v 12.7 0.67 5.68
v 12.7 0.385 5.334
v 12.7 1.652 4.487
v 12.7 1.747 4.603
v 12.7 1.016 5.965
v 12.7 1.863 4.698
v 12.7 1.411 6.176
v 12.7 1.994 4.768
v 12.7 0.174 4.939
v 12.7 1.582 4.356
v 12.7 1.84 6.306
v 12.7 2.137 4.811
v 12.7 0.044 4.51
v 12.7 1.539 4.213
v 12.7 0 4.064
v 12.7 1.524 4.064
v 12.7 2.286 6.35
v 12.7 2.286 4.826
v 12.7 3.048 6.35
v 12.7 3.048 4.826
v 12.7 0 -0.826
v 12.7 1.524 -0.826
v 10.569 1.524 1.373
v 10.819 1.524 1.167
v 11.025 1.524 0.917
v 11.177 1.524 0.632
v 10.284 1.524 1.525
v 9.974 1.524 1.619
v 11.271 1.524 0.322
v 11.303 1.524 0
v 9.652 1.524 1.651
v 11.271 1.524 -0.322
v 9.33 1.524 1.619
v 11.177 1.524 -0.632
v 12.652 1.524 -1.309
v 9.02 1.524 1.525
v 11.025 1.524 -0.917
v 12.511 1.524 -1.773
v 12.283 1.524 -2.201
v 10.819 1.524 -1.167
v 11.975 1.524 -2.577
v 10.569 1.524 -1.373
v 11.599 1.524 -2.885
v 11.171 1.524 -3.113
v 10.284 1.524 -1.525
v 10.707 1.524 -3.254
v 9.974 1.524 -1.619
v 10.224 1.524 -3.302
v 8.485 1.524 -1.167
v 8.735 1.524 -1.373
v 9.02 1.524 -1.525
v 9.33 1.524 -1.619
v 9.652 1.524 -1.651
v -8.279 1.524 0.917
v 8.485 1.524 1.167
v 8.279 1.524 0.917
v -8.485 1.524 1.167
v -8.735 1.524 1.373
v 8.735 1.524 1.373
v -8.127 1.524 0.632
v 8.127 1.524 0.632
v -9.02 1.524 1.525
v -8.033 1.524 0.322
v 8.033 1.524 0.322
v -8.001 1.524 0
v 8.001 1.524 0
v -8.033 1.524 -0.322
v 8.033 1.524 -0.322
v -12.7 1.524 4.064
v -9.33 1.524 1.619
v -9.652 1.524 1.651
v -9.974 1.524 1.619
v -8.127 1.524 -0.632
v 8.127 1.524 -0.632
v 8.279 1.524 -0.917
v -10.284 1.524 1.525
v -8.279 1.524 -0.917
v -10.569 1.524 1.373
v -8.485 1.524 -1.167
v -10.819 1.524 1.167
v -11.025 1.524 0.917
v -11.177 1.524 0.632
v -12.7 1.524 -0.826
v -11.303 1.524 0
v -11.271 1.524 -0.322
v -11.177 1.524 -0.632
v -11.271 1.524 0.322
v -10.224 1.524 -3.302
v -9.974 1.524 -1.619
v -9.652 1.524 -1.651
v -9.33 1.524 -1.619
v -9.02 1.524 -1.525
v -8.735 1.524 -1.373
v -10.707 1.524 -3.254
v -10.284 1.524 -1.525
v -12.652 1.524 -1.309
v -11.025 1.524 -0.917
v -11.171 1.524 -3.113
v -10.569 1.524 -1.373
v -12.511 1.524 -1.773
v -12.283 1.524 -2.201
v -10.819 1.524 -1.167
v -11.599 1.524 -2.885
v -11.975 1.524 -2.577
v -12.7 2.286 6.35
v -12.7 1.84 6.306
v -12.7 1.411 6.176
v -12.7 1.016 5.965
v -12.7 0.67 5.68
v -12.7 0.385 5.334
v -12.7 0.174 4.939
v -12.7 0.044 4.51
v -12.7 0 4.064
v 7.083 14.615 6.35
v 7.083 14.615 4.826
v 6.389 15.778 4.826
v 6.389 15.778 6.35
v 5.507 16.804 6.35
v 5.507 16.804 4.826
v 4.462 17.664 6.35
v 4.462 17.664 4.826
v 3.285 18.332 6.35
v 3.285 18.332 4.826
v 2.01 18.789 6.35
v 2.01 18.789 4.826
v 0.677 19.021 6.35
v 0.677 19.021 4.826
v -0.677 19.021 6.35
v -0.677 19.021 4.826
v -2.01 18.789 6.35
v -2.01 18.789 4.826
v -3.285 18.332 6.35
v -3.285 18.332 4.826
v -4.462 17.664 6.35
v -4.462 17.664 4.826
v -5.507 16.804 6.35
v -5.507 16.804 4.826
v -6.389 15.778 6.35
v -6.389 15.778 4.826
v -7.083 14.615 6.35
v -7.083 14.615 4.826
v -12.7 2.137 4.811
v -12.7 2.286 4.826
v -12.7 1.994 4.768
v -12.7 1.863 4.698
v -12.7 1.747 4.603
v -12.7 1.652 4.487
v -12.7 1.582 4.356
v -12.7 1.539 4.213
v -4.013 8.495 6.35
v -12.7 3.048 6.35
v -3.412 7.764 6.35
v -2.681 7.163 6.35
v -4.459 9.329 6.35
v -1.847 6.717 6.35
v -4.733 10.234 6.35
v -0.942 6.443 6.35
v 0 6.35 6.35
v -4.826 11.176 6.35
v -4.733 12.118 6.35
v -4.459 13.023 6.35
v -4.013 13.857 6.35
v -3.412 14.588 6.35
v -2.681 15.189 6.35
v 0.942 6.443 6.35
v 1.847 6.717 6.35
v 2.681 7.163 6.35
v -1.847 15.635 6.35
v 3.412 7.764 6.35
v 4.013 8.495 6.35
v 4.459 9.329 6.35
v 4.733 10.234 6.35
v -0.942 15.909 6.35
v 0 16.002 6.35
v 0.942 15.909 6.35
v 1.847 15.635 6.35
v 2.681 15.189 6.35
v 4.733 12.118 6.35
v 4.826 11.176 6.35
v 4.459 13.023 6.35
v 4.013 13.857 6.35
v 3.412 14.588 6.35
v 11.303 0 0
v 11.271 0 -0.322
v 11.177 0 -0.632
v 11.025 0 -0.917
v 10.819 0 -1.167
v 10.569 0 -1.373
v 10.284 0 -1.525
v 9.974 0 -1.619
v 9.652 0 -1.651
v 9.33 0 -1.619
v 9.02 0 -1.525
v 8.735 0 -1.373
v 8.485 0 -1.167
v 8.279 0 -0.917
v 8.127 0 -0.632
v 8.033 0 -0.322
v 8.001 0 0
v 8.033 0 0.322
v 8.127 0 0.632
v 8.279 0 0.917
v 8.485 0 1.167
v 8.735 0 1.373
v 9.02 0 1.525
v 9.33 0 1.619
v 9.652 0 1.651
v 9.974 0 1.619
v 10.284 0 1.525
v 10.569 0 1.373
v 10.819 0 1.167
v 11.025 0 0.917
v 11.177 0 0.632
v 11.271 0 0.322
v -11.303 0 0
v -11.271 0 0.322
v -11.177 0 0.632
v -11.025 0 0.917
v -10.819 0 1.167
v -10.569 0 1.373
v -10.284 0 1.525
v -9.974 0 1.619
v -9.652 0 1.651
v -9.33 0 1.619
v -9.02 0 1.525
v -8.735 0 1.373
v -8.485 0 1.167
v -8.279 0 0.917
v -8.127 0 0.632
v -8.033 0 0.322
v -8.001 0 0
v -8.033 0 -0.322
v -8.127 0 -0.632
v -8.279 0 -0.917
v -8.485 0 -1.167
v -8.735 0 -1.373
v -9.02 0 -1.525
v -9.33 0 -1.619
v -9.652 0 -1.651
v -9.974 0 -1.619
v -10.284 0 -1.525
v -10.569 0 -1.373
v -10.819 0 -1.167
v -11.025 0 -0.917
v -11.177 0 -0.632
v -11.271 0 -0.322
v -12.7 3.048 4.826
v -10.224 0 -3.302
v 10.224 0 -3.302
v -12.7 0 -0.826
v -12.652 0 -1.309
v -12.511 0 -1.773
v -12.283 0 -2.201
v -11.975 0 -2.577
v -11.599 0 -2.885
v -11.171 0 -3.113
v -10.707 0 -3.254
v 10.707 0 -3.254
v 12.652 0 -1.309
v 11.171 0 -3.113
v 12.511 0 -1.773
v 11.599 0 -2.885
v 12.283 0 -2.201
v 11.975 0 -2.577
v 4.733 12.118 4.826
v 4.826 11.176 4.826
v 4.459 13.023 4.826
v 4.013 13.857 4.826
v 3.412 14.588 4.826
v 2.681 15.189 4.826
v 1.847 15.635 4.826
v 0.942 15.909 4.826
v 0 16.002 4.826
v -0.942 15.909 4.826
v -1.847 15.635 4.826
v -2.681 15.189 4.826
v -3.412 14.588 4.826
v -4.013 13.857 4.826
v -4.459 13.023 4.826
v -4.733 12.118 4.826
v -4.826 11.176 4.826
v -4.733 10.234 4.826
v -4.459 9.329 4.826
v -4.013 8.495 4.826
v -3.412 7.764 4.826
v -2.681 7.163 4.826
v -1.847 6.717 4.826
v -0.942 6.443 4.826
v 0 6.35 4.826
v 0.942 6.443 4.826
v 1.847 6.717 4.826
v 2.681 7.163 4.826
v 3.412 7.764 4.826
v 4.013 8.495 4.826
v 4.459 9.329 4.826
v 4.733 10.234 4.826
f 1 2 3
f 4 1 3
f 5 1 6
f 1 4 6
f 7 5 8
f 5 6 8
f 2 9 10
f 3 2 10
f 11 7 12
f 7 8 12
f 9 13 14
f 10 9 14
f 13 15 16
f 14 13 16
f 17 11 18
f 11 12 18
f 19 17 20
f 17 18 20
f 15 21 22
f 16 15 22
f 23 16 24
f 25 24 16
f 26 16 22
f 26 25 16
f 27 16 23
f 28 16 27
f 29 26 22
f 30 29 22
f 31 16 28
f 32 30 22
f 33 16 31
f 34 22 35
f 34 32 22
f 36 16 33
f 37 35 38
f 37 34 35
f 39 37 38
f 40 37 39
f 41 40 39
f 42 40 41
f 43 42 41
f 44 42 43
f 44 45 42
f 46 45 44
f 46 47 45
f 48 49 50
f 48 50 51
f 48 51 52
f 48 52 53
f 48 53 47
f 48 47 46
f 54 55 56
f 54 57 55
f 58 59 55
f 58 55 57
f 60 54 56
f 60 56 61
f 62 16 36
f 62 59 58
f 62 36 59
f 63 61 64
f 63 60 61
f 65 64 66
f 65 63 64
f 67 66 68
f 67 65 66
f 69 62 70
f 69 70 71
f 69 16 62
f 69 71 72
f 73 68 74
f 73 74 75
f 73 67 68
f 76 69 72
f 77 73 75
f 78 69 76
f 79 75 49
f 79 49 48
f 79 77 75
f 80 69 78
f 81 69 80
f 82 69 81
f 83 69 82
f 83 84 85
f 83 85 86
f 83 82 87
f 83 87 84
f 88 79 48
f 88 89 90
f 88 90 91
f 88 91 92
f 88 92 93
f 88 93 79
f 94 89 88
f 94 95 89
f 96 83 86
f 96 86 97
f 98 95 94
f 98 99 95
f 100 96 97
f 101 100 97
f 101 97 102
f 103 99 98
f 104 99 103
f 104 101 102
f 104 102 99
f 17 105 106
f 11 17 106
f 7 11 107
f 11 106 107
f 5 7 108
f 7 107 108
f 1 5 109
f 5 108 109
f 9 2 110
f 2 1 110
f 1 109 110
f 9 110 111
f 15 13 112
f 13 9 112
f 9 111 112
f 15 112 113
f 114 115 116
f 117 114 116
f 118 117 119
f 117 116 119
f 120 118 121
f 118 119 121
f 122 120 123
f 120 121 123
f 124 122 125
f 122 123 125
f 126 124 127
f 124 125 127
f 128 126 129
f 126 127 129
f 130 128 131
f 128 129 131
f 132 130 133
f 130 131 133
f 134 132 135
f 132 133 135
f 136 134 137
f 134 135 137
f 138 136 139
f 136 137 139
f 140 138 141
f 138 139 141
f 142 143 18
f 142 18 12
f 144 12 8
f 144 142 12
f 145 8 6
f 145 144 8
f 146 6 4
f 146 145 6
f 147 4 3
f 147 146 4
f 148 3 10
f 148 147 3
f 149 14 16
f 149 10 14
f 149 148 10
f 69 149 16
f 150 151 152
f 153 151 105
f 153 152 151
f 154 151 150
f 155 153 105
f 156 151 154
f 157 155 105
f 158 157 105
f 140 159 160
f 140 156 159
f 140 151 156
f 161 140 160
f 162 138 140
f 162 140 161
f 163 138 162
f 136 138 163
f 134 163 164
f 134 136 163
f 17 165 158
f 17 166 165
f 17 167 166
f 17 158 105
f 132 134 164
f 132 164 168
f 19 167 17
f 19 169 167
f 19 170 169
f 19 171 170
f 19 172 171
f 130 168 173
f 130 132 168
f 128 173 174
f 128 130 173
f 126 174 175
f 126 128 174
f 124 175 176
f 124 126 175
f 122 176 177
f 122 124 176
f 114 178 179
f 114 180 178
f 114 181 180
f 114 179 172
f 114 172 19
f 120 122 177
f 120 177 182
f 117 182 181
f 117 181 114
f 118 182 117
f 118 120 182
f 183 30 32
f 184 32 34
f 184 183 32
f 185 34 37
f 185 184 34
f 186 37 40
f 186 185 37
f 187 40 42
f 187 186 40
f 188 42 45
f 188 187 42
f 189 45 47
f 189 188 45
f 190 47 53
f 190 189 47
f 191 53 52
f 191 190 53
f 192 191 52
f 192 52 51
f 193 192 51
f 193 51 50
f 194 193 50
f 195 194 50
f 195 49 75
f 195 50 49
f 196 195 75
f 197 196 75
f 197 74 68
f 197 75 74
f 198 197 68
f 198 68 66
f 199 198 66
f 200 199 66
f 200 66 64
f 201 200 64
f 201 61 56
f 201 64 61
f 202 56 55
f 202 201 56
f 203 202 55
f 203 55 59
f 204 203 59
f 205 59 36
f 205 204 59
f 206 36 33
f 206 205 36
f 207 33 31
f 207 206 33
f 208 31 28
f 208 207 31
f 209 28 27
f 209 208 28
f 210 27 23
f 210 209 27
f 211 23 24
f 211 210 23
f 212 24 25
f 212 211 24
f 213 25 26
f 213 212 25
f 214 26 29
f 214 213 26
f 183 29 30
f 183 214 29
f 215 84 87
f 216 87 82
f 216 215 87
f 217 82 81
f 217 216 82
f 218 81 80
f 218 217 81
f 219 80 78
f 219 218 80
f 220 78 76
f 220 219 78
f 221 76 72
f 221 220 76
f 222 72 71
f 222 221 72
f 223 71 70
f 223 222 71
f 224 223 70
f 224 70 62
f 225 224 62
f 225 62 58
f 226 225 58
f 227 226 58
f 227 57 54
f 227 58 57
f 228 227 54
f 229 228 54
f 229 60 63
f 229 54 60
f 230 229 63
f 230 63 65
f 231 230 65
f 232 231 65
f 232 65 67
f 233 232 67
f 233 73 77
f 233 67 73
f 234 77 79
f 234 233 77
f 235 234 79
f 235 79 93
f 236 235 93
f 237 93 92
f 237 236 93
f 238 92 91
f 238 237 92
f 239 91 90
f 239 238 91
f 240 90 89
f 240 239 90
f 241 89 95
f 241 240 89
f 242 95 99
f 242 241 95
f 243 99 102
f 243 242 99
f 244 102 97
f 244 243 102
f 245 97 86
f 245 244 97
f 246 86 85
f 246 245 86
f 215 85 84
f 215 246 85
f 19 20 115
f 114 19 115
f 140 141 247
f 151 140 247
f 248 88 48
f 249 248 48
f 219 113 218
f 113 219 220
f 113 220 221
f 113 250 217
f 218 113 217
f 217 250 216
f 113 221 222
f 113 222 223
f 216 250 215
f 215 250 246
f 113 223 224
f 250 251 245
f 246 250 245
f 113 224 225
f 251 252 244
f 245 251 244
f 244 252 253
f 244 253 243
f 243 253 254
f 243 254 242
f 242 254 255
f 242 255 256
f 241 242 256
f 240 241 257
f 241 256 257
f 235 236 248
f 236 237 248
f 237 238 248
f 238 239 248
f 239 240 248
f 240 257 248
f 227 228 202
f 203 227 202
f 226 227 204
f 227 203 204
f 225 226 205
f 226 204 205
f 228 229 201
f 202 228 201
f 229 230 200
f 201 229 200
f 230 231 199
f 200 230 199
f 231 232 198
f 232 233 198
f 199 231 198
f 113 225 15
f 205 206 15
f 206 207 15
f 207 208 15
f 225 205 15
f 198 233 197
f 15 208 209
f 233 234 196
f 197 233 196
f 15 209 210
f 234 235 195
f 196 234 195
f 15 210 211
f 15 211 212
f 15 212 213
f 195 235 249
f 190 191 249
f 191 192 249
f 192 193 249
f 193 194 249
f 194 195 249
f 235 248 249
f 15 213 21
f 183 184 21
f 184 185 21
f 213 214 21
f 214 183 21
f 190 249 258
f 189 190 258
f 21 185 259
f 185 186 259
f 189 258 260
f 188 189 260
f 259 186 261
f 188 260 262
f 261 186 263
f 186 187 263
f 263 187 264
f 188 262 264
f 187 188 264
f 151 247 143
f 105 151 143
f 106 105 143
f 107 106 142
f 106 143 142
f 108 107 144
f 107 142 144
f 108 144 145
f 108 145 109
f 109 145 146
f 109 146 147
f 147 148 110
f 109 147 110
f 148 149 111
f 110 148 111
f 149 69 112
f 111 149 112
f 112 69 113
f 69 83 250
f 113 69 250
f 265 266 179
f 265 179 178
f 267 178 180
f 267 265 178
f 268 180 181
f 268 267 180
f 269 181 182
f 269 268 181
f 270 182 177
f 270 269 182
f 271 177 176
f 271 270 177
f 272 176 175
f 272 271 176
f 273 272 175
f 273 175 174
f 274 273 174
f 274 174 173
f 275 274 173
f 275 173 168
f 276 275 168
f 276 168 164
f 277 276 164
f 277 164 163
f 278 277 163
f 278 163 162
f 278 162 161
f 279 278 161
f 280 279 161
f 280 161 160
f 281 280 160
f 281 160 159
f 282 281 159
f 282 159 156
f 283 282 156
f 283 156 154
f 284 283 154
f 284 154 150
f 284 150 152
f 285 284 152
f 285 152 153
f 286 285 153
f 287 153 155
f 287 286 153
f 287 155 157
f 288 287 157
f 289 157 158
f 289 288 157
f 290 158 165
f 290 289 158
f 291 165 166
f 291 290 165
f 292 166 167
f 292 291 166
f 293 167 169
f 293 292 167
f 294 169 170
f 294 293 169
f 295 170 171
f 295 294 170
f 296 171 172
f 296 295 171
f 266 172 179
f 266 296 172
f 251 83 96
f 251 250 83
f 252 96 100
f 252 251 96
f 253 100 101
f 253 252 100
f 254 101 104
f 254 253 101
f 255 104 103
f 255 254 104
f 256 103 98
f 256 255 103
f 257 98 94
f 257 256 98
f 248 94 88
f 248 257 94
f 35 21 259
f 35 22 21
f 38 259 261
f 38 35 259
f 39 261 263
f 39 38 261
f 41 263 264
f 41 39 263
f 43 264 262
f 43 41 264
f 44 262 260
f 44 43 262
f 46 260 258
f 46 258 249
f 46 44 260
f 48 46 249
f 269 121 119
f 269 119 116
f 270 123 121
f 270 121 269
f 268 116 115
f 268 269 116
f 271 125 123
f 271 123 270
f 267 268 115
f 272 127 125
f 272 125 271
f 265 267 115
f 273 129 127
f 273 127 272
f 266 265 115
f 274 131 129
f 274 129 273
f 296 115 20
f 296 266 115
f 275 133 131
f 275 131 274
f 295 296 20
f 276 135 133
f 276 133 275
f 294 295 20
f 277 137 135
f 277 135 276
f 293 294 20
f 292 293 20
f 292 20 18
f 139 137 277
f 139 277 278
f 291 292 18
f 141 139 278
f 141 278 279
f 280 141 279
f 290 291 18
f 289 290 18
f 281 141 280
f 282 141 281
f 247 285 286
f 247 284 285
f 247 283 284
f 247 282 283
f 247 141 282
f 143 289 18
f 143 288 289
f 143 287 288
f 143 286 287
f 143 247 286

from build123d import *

# Parameters (mm, degrees)
BOSS_EXTRUDE1_DEPTH      = 6.35
BOSS_EXTRUDE1_DEPTH_BACK = 3.302
SKETCH3_R                = 4.826
SKETCH4_R                = 1.651
CUT_EXTRUDE1_DEPTH       = 24.759524406
CUT_EXTRUDE2_DEPTH       = 33.378773911
FILLET1_R                = 2.4765


with BuildPart() as part:
    # Sketch3 → Boss-Extrude1 (new, two sides: drawn at the far end of the back side and taken through both)
    with BuildSketch(Plane.XY.offset(-BOSS_EXTRUDE1_DEPTH_BACK)):
        with BuildLine():
            Line((-12.7, 0), (12.7, 0))
            Line((12.7, 0), (12.7, 3.048))
            Line((12.7, 3.048), (7.083102209, 14.615409702))
            ThreePointArc((7.083102209, 14.615409702), (0, 19.05), (-7.083102209, 14.615409702))
            Line((-7.083102209, 14.615409702), (-12.7, 3.048))
            Line((-12.7, 3.048), (-12.7, 0))
        make_face()
        with Locations((0, 11.176)):
            Circle(SKETCH3_R, mode=Mode.SUBTRACT)
    extrude(amount=BOSS_EXTRUDE1_DEPTH + BOSS_EXTRUDE1_DEPTH_BACK)

    # Sketch4 → Cut-Extrude1 (cut, through all)
    with BuildSketch(Plane(origin=(0, 0, 0), x_dir=(1, 0, 0), z_dir=(0, 1, 0))):
        with Locations((9.652, 0)):
            Circle(SKETCH4_R)
        with Locations(Location((-9.652, 0, 0), (0, 0, 180))):
            Circle(SKETCH4_R)
    extrude(amount=CUT_EXTRUDE1_DEPTH, mode=Mode.SUBTRACT)

    # Sketch5 → Cut-Extrude2 (cut, through all)
    with BuildSketch(Plane.ZY.offset(12.7)):
        with BuildLine():
            Line((-3.302, 19.05), (4.826, 19.05))
            Line((4.826, 19.05), (4.826, 2.286))
            ThreePointArc((4.826, 2.286), (4.602815367, 1.747184633), (4.064, 1.524))
            Line((4.064, 1.524), (-3.302, 1.524))
            Line((-3.302, 1.524), (-3.302, 19.05))
        make_face()
        with BuildLine():
            Line((4.064, 0), (6.35, 0))
            Line((6.35, 0), (6.35, 2.286))
            ThreePointArc((6.35, 2.286), (5.680446102, 0.669553898), (4.064, 0))
        make_face()
    extrude(amount=-CUT_EXTRUDE2_DEPTH, mode=Mode.SUBTRACT)

    # Fillet1
    fillet1_edges = [part.edges().sort_by_distance(p)[0] for p in [
        (12.7, 0.762, -3.302),
        (-12.7, 0.762, -3.302),
    ]]
    fillet(fillet1_edges, radius=FILLET1_R)


solid = part.part
